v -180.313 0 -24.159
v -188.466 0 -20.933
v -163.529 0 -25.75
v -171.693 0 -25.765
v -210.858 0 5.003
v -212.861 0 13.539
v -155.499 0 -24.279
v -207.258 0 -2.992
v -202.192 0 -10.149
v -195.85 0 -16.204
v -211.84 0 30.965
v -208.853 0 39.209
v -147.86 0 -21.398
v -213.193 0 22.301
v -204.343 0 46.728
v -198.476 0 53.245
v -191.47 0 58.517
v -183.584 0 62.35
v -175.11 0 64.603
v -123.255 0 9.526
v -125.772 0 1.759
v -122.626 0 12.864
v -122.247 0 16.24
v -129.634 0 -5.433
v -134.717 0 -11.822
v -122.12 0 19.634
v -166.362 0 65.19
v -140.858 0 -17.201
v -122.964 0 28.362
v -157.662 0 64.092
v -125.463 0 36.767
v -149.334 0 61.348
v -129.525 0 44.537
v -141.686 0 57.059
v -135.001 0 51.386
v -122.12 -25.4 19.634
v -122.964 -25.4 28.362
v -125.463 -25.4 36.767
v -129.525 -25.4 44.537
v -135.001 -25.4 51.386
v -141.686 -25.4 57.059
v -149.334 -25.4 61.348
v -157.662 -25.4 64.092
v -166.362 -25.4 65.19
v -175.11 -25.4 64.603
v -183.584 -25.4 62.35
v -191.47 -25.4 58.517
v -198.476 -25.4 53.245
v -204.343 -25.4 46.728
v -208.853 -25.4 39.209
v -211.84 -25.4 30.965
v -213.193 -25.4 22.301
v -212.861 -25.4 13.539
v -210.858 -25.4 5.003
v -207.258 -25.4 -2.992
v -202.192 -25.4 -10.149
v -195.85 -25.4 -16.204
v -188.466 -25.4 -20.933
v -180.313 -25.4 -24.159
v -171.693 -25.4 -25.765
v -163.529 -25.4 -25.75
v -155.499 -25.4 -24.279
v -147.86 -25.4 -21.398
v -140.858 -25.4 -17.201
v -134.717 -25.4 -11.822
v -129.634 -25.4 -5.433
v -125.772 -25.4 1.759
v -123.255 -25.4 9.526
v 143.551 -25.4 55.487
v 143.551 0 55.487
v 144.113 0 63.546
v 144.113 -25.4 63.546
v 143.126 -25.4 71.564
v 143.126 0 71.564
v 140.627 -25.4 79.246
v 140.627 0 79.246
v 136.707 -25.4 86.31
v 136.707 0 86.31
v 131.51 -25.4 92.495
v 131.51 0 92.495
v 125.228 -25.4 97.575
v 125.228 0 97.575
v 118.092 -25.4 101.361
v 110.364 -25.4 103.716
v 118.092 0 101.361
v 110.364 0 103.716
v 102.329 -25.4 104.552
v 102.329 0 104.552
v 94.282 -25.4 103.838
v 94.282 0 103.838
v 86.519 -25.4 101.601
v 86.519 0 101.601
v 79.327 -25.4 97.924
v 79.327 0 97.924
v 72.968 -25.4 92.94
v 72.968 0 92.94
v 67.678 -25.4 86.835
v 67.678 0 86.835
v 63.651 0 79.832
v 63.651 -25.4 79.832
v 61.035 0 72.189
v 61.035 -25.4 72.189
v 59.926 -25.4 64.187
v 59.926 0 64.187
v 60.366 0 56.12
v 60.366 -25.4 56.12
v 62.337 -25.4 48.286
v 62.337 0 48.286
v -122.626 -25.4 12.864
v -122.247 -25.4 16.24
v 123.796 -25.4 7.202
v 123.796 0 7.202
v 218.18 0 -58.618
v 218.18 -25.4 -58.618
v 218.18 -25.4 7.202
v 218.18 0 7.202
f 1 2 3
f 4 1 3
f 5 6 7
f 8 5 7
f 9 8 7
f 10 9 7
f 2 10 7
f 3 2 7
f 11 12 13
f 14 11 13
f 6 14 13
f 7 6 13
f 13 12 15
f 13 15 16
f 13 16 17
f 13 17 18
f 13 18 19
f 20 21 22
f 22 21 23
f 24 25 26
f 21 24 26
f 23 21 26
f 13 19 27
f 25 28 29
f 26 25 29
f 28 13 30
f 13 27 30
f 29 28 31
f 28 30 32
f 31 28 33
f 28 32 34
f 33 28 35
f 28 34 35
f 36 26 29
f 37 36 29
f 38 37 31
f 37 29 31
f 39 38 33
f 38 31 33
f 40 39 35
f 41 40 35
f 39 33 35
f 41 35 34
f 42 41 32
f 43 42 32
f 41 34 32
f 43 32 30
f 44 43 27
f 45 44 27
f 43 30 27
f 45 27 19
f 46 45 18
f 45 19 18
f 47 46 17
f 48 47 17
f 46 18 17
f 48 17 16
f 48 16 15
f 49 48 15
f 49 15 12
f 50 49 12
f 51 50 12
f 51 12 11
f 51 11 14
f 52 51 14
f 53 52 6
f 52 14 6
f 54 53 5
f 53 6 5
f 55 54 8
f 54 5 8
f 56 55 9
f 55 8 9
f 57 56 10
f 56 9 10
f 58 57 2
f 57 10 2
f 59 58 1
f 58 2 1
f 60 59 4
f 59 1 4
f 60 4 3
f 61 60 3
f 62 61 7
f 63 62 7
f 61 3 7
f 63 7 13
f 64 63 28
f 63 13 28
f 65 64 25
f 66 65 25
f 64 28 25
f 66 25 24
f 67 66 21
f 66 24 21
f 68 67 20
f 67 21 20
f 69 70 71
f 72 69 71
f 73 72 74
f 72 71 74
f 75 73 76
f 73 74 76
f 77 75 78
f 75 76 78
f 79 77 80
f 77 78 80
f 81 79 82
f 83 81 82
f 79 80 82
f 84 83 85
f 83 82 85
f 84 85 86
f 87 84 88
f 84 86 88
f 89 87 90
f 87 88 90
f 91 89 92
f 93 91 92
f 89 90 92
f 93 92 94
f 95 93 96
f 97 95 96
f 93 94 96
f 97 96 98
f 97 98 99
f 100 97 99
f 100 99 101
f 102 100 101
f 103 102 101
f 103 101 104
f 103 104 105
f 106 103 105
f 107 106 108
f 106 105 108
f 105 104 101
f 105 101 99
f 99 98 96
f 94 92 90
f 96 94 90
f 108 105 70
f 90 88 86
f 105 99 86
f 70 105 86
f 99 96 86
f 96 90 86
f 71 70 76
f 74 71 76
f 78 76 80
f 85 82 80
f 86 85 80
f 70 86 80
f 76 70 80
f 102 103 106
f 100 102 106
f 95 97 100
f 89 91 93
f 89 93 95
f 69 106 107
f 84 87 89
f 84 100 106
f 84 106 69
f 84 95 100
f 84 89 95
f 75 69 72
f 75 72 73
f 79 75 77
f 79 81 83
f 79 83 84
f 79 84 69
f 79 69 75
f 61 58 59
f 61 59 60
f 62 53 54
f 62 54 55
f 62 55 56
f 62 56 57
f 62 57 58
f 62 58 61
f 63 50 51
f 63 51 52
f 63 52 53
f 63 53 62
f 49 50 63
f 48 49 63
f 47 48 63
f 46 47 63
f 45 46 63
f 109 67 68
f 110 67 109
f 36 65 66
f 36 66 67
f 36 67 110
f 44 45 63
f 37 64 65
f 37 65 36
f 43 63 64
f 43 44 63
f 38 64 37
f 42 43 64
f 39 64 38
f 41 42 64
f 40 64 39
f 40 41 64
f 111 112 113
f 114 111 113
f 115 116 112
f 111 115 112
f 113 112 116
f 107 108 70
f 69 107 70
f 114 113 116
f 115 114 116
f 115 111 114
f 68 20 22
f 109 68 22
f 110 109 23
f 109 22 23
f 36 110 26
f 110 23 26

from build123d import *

# Parameters (mm, degrees)
F1_DEPTH = 25.4


with BuildPart() as f1:
    # F0 (on Front) → F1 (new body)
    with BuildSketch(Plane.XZ):
        with BuildLine():
            ThreePointArc((-123.255483, 9.525602), (-122.404942, 14.548261), (-122.120243, 19.634465))
            ThreePointArc((-122.120243, 19.634465), (-198.476408, 53.244697), (-171.693037, -25.765193))
            ThreePointArc((-171.693037, -25.765193), (-150.010482, -4.638764), (-123.255483, 9.525602))
        make_face()
        with BuildLine():
            ThreePointArc((-123.255483, 9.525602), (-150.010482, -4.638764), (-171.693037, -25.765193))
            ThreePointArc((-171.693037, -25.765193), (-140.857879, -17.200954), (-123.255483, 9.525602))
        make_face()
        with BuildLine():
            Line((62.337082, 48.285719), (143.550888, 55.487365))
            ThreePointArc((143.550888, 55.487365), (98.288388, 104.388255), (62.337082, 48.285719))
        make_face()
        Polygon((218.179792, 7.202301), (123.79618, 7.202301), (218.179792, -58.618125), align=None)
    extrude(amount=F1_DEPTH)


solid = f1.part
